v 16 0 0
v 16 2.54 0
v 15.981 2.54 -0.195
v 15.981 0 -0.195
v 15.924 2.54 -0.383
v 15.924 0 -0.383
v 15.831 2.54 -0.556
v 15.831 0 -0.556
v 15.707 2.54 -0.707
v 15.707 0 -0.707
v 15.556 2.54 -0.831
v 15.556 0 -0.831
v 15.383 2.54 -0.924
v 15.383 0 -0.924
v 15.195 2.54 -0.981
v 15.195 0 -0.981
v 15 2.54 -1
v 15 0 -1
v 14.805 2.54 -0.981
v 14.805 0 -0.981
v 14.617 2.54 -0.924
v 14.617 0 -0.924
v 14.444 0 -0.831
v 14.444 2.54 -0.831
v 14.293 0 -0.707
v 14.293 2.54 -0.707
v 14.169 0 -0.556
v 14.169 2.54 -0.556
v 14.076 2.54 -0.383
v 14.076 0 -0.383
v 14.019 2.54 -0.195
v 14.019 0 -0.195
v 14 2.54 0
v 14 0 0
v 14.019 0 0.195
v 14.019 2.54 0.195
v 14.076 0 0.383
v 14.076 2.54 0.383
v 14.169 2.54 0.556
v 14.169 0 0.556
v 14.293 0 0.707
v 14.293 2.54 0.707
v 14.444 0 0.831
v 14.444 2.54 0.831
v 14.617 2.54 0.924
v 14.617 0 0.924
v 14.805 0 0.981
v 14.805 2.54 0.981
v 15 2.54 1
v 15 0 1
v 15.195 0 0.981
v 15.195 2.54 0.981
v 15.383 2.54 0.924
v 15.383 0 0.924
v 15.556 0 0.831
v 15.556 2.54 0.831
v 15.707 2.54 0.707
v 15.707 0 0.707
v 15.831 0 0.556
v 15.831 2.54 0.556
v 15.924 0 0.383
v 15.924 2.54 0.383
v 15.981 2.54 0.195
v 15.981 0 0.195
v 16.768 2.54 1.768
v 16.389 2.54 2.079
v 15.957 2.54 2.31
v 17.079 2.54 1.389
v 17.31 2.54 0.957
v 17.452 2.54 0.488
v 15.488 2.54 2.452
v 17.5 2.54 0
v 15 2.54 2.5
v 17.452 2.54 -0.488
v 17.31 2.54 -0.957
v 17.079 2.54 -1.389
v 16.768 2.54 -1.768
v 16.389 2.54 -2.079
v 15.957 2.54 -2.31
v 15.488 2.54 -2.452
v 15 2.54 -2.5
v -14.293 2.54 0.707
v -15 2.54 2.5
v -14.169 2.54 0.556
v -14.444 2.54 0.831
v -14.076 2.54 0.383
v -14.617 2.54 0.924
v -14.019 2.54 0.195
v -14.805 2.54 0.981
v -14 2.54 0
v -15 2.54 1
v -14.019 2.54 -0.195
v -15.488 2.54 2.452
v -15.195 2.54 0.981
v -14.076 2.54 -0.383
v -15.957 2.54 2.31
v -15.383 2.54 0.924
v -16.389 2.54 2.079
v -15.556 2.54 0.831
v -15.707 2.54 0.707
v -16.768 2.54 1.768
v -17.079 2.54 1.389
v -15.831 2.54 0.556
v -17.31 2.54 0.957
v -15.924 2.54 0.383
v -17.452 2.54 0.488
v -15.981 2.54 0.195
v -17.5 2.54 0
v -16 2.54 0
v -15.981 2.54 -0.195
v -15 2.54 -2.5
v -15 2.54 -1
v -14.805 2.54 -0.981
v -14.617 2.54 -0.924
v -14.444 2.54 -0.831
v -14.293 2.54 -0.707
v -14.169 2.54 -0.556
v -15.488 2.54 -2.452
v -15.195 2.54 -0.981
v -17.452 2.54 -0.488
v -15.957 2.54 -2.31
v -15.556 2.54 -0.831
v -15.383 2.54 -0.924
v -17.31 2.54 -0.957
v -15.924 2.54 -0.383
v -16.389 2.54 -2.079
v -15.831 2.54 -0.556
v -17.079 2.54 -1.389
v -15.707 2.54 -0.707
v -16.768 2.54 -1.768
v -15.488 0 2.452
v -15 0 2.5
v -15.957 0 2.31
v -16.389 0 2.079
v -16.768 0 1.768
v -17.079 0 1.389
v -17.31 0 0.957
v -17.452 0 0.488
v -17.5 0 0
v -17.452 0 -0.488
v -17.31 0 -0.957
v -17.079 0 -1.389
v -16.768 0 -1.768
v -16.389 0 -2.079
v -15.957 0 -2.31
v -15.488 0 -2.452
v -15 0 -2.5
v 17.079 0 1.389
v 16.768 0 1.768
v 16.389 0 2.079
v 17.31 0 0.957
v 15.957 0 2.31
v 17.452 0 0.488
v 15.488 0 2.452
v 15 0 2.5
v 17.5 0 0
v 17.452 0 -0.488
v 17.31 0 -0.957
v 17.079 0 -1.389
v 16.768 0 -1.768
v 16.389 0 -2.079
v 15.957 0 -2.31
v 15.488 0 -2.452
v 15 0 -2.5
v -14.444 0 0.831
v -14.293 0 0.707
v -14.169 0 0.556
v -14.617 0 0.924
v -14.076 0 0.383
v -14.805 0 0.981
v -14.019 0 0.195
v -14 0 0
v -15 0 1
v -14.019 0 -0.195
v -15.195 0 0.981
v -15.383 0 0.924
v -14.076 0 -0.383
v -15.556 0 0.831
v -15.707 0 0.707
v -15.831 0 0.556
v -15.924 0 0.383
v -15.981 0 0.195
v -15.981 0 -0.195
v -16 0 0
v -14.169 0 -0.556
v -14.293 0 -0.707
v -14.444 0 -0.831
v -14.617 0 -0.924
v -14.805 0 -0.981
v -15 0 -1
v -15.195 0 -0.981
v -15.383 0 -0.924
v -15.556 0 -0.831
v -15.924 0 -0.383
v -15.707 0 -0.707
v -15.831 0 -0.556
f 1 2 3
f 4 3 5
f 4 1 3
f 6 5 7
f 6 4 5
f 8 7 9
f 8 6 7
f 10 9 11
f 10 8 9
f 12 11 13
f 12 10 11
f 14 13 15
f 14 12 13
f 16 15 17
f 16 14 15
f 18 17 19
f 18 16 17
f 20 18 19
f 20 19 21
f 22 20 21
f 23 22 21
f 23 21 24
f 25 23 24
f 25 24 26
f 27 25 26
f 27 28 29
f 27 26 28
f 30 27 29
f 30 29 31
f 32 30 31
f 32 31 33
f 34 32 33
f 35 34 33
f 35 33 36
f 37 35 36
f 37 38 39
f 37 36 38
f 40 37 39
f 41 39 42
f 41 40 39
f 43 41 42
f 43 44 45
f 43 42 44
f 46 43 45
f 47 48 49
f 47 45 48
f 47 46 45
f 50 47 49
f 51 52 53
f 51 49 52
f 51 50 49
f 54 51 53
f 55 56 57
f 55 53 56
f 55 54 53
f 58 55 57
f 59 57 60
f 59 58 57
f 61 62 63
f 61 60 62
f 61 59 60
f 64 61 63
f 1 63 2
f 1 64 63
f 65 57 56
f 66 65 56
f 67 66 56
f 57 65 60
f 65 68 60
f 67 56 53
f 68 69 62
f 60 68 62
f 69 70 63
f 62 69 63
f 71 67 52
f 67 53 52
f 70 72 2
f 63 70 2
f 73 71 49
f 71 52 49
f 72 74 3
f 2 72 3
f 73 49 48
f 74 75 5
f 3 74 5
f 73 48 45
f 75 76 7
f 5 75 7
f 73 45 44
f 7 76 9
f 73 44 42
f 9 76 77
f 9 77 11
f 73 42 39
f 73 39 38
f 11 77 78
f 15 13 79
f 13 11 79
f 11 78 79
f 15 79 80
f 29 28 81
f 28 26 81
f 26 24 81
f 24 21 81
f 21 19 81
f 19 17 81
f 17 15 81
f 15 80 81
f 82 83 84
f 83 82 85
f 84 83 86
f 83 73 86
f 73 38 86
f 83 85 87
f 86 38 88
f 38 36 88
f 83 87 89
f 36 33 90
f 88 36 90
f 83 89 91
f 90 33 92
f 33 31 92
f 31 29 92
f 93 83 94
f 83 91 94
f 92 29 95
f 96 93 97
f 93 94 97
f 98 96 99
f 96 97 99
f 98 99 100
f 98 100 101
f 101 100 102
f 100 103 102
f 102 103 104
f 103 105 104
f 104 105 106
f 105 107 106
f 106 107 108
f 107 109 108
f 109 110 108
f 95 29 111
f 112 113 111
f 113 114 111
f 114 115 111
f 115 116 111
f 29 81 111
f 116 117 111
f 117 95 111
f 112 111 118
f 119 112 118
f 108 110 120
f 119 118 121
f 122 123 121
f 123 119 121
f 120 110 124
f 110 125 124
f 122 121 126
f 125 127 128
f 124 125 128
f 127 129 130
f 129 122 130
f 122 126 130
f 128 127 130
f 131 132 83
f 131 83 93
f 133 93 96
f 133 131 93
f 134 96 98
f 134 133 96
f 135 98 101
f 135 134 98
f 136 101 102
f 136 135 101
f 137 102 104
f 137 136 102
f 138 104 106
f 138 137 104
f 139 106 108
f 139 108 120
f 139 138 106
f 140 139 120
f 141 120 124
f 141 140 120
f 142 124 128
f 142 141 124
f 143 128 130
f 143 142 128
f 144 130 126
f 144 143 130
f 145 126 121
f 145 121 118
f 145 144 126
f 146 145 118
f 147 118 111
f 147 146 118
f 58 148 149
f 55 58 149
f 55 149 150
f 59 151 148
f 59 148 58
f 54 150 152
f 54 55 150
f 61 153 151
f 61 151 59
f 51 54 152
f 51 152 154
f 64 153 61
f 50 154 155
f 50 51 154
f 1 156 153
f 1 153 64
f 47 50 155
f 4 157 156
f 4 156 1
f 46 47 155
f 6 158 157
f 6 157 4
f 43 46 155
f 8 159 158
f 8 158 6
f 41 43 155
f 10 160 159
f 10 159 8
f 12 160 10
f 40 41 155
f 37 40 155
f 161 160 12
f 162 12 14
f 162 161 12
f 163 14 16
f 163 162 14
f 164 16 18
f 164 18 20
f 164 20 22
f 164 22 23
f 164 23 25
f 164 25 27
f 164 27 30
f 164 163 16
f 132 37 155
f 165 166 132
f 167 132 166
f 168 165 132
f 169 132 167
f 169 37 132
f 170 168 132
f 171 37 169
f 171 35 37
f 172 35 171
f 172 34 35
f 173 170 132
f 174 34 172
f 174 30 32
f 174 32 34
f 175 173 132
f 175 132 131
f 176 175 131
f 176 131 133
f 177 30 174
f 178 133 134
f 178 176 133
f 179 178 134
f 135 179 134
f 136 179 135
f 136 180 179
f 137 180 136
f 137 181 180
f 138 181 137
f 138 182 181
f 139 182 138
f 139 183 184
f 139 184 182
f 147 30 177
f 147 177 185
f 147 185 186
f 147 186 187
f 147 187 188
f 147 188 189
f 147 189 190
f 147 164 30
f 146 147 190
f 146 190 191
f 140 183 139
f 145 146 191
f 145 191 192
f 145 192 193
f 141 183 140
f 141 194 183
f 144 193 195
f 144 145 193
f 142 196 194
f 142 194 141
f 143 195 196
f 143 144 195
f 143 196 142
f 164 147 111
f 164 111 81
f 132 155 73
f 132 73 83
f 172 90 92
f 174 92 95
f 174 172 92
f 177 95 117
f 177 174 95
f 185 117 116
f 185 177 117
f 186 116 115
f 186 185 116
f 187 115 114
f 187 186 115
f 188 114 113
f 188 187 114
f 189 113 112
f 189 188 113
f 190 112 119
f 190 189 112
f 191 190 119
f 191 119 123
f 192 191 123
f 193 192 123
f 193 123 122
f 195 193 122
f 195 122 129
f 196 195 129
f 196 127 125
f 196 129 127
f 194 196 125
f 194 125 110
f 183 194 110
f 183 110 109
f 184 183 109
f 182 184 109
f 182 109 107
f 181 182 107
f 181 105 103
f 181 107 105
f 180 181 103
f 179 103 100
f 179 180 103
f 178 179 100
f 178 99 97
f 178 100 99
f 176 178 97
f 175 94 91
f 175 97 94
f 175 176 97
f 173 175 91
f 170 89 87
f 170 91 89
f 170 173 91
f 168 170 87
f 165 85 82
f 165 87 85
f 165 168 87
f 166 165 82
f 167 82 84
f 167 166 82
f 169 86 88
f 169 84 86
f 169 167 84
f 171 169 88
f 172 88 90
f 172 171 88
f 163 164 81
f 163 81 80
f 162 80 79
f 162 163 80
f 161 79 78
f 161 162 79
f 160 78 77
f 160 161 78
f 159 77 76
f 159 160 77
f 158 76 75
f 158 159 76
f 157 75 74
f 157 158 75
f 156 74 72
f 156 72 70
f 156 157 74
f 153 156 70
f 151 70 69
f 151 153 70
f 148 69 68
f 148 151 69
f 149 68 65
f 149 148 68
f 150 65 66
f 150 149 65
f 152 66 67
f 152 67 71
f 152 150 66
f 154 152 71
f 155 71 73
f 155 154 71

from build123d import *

# Parameters (mm, degrees)
BOSS_EXTRUDE1_DEPTH     = 2.54
SKETCH2_R               = 1
CUT_EXTRUDE1_DEPTH      = 3.54
CUT_EXTRUDE1_DEPTH_BACK = 1


with BuildPart() as part:
    # Sketch1 → Boss-Extrude1 (new body)
    with BuildSketch(Plane(origin=(0, 0, 0), x_dir=(1, 0, 0), z_dir=(0, 1, 0))):
        with BuildLine():
            Line((-15, 2.5), (15, 2.5))
            ThreePointArc((15, 2.5), (17.5, 0), (15, -2.5))
            Line((15, -2.5), (-15, -2.5))
            ThreePointArc((-15, -2.5), (-17.5, 0), (-15, 2.5))
        make_face()
    extrude(amount=BOSS_EXTRUDE1_DEPTH)

    # Sketch2 → Cut-Extrude1 (cut, two sides)
    with BuildSketch(Plane(origin=(0, 0, 0), x_dir=(1, 0, 0), z_dir=(0, 1, 0))) as cut_extrude1_sk:
        with Locations((-15, 0)):
            Circle(SKETCH2_R)
        with Locations((15, 0)):
            Circle(SKETCH2_R)
    extrude(amount=CUT_EXTRUDE1_DEPTH, mode=Mode.SUBTRACT)
    extrude(cut_extrude1_sk.sketch, amount=-CUT_EXTRUDE1_DEPTH_BACK, mode=Mode.SUBTRACT)


solid = part.part
